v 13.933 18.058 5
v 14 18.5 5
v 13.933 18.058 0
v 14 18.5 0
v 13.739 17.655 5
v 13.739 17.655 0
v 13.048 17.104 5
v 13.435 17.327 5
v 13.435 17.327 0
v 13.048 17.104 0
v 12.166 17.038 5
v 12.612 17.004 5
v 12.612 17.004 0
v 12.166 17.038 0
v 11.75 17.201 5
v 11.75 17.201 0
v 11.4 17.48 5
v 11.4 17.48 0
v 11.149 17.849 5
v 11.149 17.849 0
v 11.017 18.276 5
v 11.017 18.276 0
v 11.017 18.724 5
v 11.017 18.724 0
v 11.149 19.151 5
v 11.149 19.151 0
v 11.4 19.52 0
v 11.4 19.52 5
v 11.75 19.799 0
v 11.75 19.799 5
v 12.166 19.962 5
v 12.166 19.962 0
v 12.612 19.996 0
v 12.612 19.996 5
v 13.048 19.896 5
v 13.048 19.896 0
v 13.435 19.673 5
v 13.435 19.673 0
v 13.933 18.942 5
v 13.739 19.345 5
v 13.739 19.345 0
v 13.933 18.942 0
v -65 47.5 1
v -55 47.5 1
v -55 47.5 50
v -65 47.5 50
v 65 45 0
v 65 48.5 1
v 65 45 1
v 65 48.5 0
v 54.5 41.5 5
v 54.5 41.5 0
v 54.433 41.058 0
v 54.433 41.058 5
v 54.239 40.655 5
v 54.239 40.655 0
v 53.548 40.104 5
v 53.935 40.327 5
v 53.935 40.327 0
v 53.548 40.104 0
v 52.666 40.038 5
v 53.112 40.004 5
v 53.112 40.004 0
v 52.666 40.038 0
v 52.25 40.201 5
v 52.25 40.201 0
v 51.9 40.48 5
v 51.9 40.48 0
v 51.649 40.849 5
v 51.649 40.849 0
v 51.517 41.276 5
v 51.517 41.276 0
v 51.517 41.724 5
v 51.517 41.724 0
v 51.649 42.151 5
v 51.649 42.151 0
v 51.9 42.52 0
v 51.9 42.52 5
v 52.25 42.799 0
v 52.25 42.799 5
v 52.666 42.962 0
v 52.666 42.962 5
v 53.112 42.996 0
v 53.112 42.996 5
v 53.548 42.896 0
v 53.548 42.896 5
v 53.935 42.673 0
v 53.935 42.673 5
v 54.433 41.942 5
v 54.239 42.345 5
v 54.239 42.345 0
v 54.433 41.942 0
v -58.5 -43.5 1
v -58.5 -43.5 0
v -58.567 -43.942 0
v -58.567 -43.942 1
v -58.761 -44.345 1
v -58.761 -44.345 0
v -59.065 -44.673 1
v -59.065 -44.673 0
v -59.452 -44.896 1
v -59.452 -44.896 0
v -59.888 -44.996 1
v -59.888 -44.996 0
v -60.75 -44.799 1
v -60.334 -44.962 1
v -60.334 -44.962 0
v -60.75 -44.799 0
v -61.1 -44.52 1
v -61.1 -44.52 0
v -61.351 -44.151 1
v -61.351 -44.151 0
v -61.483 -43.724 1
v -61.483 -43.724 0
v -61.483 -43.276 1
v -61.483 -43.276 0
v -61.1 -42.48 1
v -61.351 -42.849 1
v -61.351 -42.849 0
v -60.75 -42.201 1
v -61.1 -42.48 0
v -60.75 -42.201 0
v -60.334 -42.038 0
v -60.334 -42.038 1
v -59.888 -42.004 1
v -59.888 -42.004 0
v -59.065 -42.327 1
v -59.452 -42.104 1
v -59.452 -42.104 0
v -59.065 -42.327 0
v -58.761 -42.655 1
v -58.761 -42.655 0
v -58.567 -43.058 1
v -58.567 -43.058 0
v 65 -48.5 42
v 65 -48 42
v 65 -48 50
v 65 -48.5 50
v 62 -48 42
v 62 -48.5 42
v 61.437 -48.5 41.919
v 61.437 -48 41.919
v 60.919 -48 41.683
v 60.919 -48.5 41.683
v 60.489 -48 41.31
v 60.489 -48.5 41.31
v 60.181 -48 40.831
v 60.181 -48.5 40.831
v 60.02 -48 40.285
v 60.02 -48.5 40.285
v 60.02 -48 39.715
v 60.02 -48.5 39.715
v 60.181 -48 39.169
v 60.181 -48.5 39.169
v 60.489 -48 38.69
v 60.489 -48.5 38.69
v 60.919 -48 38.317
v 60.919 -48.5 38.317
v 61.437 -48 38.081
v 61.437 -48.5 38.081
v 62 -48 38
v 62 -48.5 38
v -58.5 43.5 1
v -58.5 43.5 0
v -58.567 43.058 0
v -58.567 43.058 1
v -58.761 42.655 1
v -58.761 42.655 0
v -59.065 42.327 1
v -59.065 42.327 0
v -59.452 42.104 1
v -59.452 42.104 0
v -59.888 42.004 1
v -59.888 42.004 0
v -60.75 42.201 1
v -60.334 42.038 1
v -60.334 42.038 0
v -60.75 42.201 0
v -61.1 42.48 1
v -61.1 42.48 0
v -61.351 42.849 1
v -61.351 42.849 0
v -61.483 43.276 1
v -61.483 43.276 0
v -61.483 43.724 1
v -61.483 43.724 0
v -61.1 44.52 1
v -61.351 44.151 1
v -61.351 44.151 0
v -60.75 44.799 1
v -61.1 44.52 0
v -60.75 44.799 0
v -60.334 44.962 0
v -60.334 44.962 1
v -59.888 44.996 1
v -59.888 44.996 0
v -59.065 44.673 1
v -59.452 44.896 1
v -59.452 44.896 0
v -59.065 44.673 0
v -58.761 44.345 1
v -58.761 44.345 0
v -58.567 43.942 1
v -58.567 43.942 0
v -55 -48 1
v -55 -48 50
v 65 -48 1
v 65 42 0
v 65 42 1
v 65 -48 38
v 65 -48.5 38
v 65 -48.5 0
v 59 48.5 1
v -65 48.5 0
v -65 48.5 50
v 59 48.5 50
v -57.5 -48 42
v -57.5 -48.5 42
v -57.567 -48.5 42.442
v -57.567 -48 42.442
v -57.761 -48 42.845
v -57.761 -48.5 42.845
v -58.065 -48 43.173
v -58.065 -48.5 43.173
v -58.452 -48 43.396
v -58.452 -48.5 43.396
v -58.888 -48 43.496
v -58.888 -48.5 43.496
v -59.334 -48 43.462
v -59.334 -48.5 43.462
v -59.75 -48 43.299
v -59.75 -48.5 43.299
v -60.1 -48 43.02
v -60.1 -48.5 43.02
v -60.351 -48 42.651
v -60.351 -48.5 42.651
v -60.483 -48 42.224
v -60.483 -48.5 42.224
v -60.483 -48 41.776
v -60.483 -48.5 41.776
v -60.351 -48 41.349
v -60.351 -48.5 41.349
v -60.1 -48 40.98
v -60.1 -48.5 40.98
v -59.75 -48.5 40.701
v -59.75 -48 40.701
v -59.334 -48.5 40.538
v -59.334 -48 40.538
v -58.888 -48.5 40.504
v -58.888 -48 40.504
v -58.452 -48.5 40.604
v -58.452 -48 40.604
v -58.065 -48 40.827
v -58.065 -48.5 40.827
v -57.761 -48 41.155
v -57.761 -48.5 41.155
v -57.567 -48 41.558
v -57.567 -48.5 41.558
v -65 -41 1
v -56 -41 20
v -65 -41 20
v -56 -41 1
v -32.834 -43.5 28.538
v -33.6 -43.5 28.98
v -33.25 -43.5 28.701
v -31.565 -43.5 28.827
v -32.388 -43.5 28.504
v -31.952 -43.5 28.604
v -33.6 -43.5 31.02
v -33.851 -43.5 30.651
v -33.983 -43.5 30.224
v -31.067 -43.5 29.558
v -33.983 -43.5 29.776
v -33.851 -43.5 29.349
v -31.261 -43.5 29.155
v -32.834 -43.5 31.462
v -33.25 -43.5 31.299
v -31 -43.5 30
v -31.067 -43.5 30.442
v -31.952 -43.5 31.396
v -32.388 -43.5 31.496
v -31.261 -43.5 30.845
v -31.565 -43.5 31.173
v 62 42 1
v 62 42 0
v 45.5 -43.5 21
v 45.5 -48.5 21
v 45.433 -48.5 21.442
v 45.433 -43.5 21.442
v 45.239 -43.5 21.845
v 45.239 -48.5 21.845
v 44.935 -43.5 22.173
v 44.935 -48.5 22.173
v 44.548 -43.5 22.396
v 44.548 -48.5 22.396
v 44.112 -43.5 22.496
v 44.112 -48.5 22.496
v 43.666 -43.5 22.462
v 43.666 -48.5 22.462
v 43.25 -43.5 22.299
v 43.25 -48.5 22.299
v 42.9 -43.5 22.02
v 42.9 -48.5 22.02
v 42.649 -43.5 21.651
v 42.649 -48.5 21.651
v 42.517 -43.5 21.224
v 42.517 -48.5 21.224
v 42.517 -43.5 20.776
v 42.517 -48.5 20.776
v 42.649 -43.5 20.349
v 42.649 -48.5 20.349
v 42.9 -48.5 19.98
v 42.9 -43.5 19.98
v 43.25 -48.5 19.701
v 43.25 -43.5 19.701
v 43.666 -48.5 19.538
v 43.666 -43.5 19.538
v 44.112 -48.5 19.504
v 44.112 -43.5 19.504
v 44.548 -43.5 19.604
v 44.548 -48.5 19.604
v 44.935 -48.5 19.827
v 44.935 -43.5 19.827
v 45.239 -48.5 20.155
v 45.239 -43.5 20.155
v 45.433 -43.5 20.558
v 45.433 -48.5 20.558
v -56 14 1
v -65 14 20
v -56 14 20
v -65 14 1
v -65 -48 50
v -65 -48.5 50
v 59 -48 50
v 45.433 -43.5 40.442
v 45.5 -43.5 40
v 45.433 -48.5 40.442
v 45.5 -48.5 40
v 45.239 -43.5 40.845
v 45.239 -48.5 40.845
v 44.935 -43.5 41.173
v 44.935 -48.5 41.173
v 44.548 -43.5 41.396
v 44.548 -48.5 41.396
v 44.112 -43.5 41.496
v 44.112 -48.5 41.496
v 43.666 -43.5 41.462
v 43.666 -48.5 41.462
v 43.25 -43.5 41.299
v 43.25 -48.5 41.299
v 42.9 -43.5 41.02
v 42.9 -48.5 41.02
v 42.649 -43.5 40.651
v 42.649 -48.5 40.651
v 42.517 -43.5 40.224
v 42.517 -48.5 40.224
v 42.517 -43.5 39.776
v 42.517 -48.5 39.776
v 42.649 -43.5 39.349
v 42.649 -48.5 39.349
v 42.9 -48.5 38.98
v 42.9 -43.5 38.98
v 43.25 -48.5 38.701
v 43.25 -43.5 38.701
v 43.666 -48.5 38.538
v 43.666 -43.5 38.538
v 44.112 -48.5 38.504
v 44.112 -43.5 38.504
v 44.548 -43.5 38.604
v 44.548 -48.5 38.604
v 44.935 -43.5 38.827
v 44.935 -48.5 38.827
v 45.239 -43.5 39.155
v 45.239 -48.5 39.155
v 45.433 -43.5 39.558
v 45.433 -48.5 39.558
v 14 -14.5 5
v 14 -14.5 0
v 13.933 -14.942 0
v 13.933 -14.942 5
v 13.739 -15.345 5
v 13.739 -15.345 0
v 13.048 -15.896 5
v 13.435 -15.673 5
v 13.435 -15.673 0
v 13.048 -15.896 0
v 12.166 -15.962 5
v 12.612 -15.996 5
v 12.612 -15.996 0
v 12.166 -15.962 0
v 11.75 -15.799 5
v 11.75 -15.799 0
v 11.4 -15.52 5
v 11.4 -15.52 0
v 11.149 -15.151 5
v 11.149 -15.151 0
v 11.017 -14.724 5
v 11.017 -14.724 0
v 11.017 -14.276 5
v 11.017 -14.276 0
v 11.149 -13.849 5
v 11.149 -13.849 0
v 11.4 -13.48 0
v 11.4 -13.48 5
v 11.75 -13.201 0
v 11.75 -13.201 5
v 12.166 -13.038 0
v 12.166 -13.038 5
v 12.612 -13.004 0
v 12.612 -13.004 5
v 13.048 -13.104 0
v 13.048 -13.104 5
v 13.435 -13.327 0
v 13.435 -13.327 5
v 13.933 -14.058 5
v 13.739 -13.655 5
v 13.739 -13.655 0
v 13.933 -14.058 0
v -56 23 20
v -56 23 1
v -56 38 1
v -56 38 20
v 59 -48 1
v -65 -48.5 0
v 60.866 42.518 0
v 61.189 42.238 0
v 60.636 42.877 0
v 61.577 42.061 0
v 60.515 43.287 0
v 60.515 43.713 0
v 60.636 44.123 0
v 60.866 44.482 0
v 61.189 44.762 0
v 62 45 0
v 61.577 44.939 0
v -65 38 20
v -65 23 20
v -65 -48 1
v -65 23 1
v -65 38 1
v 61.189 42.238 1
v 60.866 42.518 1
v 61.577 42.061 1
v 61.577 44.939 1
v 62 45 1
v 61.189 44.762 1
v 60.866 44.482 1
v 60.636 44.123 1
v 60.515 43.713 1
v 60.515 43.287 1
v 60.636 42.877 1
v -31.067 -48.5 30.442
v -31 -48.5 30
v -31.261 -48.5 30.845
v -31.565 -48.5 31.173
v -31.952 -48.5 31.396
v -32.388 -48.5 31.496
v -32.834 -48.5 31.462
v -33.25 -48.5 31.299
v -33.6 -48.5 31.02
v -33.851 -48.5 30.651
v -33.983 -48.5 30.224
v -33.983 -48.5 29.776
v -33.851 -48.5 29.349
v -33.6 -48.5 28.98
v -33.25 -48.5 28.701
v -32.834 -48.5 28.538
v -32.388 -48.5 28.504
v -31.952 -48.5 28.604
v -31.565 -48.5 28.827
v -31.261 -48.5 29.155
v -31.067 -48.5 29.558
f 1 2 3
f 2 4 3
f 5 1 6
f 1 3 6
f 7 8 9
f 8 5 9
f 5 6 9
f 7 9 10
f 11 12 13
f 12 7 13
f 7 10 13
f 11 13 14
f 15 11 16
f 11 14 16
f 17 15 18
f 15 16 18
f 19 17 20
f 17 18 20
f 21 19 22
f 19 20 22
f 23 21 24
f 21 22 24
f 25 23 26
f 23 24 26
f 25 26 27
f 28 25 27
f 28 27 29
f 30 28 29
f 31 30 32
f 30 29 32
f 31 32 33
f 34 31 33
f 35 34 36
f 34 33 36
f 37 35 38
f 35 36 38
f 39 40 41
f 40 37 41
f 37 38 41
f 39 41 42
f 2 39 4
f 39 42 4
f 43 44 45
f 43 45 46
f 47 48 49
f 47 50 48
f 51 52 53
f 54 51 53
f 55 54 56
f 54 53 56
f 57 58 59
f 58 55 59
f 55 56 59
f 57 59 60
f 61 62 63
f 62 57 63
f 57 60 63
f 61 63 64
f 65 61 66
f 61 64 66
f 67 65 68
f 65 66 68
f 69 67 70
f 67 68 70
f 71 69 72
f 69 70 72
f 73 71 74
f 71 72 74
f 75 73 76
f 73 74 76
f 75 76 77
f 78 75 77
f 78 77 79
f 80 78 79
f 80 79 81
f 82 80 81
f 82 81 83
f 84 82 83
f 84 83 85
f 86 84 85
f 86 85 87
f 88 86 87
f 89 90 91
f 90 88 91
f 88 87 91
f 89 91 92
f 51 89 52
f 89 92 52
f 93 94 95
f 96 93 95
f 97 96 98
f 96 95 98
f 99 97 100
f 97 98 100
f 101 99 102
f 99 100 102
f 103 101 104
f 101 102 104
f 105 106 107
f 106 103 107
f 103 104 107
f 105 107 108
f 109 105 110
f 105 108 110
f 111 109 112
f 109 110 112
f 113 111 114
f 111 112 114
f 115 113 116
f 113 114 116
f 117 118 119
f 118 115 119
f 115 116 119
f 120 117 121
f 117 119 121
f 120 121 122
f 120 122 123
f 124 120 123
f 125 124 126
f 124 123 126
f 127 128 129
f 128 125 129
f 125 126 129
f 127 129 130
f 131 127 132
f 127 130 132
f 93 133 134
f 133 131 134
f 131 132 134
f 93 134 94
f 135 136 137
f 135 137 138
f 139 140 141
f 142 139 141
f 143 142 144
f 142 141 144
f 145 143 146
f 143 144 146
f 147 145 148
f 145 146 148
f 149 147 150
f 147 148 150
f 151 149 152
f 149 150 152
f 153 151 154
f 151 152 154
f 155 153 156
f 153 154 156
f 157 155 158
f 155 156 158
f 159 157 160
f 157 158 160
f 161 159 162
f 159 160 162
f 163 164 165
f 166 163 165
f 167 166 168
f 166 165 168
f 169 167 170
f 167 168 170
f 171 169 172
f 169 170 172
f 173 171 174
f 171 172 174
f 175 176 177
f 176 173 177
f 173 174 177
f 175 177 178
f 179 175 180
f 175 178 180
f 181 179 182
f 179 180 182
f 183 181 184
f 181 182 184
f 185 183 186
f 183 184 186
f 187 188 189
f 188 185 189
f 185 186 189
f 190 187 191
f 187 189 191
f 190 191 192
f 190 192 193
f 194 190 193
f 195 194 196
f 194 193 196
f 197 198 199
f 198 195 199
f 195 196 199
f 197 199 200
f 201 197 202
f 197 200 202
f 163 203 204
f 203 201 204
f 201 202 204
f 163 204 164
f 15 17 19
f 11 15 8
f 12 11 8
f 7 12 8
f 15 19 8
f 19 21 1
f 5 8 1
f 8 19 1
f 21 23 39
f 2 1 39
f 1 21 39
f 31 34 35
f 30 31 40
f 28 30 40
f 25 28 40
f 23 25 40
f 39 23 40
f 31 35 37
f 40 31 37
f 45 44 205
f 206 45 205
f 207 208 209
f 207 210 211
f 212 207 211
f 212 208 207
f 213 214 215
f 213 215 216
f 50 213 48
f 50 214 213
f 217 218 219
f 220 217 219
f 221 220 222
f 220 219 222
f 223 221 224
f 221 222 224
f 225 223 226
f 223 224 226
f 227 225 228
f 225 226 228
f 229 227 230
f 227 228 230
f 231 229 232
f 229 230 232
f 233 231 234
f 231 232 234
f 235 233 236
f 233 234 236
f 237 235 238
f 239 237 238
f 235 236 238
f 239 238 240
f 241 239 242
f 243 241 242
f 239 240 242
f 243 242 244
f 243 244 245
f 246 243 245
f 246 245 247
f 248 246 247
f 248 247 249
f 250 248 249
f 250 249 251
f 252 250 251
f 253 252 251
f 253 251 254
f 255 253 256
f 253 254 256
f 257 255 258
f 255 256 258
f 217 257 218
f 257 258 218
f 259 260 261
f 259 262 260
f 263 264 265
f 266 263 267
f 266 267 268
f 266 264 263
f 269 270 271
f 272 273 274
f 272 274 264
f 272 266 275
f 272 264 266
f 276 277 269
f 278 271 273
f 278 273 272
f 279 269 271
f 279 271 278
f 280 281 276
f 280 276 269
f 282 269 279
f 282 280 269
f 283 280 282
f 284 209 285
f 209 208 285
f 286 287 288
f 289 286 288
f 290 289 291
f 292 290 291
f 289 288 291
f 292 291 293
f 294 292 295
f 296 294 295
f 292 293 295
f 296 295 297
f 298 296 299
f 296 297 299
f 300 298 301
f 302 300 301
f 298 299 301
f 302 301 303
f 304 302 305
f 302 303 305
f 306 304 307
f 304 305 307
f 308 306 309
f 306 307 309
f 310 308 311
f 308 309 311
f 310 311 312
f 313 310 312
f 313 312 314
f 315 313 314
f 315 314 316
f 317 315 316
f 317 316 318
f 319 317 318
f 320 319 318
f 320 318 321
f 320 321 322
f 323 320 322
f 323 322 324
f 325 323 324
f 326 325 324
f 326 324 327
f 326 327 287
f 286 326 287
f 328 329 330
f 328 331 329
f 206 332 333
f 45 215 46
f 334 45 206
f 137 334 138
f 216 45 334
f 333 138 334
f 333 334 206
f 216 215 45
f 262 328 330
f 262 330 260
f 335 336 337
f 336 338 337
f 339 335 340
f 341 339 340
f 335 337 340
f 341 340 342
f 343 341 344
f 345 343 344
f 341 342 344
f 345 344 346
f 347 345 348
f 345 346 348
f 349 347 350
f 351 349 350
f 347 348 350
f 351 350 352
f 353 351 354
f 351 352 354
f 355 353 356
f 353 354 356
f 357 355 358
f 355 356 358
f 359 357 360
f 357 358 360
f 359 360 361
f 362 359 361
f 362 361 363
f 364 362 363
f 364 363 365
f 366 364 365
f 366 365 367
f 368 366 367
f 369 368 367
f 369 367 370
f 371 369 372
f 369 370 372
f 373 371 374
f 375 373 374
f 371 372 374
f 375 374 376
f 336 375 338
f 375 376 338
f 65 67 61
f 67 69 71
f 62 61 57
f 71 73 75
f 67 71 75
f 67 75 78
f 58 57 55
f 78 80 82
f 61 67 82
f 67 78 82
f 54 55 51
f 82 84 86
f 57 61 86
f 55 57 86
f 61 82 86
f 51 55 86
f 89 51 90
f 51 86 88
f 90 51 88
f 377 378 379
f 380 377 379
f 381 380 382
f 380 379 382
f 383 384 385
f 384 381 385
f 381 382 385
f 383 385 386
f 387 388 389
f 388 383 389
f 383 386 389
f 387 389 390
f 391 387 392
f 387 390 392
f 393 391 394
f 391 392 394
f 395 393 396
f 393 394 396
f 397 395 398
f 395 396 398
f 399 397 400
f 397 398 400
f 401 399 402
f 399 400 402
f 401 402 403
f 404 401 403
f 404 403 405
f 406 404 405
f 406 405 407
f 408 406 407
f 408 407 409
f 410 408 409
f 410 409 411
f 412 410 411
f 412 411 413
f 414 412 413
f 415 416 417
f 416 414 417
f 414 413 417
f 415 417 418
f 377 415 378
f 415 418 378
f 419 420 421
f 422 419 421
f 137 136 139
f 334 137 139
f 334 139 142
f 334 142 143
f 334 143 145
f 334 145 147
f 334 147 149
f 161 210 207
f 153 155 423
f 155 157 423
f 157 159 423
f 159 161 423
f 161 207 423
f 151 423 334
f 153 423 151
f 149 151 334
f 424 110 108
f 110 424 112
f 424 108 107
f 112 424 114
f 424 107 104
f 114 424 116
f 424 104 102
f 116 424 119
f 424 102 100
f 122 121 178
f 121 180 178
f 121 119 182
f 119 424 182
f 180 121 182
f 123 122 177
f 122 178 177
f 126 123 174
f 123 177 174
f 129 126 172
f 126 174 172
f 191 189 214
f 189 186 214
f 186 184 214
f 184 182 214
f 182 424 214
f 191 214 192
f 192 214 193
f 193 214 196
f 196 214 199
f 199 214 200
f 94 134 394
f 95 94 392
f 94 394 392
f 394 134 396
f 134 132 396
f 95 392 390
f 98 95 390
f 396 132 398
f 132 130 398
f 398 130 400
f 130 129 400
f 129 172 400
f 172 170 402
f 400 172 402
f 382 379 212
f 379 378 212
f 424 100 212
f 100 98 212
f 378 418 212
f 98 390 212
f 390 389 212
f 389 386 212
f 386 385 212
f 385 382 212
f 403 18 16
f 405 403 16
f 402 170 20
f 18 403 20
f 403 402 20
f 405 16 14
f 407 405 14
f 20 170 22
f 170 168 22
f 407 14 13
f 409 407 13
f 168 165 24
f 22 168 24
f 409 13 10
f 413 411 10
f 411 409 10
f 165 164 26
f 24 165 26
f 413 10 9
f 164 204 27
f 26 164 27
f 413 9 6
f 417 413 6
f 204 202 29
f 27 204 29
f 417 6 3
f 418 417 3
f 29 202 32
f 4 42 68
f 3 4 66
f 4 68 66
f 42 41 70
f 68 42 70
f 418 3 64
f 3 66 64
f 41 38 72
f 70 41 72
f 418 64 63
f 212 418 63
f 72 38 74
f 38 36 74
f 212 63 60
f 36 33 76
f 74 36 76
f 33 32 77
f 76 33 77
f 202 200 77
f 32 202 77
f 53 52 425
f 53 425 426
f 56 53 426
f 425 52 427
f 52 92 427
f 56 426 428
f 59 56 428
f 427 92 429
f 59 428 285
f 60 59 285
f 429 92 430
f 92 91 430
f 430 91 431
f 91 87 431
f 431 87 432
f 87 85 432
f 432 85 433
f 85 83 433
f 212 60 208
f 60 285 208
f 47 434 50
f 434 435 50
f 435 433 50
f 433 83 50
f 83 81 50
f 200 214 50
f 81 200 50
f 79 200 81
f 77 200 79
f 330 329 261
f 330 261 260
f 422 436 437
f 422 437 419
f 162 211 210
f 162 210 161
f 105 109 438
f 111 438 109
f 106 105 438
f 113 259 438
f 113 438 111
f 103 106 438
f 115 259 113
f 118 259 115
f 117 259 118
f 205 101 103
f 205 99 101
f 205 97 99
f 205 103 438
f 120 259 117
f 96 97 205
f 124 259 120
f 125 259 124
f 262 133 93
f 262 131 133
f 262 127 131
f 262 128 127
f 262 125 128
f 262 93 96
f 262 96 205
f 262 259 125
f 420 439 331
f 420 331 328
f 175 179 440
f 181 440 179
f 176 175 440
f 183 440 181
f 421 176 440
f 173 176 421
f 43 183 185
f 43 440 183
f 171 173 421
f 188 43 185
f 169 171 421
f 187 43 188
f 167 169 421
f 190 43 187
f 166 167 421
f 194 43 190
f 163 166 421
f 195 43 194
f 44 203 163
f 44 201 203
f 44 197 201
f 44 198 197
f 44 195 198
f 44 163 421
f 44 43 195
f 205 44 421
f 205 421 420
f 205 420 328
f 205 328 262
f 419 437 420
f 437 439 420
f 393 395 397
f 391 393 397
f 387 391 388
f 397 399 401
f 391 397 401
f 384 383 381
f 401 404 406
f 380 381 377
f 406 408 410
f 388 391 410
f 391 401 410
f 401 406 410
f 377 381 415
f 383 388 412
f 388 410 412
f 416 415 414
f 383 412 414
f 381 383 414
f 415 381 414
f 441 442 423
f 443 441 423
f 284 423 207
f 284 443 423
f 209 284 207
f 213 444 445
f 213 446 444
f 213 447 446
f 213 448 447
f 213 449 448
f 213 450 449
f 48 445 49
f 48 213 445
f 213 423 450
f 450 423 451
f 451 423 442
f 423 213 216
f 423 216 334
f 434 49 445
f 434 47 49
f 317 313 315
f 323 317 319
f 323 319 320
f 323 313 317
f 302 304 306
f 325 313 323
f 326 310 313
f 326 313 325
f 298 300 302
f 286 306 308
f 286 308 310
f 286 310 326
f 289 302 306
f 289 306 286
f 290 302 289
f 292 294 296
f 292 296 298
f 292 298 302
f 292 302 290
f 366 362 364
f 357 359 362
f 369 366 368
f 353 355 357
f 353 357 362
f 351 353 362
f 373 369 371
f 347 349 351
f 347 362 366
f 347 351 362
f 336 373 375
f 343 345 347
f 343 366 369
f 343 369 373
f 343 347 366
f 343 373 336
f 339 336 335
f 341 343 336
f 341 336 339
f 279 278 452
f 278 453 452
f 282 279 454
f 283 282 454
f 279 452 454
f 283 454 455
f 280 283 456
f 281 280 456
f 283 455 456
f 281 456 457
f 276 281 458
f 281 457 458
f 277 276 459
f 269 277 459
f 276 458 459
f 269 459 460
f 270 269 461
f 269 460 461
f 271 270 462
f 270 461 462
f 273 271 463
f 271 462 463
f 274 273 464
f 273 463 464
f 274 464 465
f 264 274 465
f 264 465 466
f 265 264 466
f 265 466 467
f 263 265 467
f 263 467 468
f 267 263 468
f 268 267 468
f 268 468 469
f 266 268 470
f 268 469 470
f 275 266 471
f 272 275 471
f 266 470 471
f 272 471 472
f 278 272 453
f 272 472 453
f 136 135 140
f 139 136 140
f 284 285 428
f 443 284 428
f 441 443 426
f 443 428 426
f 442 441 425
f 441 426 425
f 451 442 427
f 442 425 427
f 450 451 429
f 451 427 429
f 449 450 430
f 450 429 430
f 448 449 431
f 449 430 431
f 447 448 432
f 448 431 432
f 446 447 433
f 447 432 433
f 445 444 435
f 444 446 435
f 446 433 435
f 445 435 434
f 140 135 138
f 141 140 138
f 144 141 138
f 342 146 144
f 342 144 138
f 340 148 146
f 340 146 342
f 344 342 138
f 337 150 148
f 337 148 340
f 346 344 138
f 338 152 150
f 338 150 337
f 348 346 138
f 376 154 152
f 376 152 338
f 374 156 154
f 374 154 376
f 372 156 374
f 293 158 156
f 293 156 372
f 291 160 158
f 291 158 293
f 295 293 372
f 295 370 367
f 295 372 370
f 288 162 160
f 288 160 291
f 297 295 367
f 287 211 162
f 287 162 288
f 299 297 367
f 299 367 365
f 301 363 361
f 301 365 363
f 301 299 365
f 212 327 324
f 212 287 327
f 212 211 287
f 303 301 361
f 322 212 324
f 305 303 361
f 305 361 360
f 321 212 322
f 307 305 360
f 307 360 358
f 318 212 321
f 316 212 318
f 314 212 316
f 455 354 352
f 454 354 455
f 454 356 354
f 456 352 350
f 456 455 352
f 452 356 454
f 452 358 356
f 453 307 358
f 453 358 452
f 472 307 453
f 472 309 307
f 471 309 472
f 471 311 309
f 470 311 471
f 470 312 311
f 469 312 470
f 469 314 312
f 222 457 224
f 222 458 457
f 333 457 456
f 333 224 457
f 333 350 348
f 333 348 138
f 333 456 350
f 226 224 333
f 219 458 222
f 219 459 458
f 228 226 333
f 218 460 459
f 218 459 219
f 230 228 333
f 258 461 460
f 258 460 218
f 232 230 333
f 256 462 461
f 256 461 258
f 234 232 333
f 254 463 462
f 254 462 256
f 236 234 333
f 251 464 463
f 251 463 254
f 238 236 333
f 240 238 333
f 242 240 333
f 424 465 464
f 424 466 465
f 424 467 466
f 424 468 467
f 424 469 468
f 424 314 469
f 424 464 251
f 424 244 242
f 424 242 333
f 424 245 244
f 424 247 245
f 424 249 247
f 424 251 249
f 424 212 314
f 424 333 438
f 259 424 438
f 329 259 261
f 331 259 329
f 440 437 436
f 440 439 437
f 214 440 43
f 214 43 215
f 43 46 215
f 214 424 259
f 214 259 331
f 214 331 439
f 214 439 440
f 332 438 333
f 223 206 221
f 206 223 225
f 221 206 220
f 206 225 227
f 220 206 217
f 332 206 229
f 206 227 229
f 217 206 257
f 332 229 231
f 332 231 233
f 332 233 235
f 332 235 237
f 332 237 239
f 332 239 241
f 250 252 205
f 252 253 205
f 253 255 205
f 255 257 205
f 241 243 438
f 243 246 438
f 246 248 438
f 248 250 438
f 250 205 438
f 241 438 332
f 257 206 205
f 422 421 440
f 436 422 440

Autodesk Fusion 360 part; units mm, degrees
sketch "Sketch1" plane through (0, 0, 0) normal (0, 0, 1) x (1, 0, 0)
  line L0 (65, -48.5) -> (-65, -48.5)
  line L1 (-65, -48.5) -> (-65, 48.5)
  line L2 (-65, 48.5) -> (65, 48.5)
  line L3 (65, 48.5) -> (65, -48.5)
  line L4 (65, -48.5) -> (-65, 48.5) construction
  line L5 (-65, -48.5) -> (65, 48.5) construction
  line L6 (-65, 48.5) -> (2983, 48.5)
  line L7 (2983, 48.5) -> (2983, -49)
  line L8 (2983, -49) -> (-65, -49)
  line L9 (-65, -49) -> (-65, 48.5)
  line L10 (-65, 48.5) -> (-55, 48.5)
  line L11 (-55, 48.5) -> (-55, -49)
  line L12 (-55, -49) -> (-65, -49)
  line L13 (-65, -49) -> (-65, 48.5)
  line L14 (65, 48.5) -> (59, 48.5)
  line L15 (59, 48.5) -> (59, 38.5)
  line L16 (59, 38.5) -> (65, 38.5)
  line L17 (65, 38.5) -> (65, 48.5)
  line L18 (59, 38.5) -> (59, -49)
  line L19 (-65, 48.5) -> (59, 48.5)
  line L20 (59, 48.5) -> (59, 47.5)
  line L21 (59, 47.5) -> (-65, 47.5)
  line L22 (-65, 47.5) -> (-65, 48.5)
  line L23 (-65, -49) -> (65, -49)
  line L24 (65, -49) -> (65, -48)
  line L25 (65, -48) -> (-65, -48)
  line L26 (-65, -48) -> (-65, -49)
  line L27 (-56, 38) -> (-65, 38)
  line L28 (-65, 38) -> (-65, 23)
  line L29 (-65, 23) -> (-56, 23)
  line L30 (-56, 23) -> (-56, 38)
  line L31 (-56, -41) -> (-65, -41)
  line L32 (-65, -41) -> (-65, 14)
  line L33 (-65, 14) -> (-56, 14)
  line L34 (-56, 14) -> (-56, -41)
  line L35 (-65, 48.5) -> (-60, 48.5) construction
  line L36 (-60, 48.5) -> (-60, 43.5) construction
  circle A0 centre (-60, 43.5) radius 1.5
  line L37 (65, 48.5) -> (53, 48.5) construction
  line L38 (53, 48.5) -> (53, 41.5) construction
  circle A1 centre (53, 41.5) radius 1.5
  line L39 (65.5, 45) -> (62, 45)
  line L40 (65.5, 42) -> (62, 42)
  arc A2 (62, 45) -> (62, 42) centre (62, 43.5) ccw
  line L41 (-65, 48.5) -> (12.5, 48.5) construction
  line L42 (12.5, 48.5) -> (12.5, 18.5) construction
  line L43 (12.5, 18.5) -> (12.5, -14.5) construction
  circle A3 centre (12.5, 18.5) radius 1.5
  circle A4 centre (12.5, -14.5) radius 1.5
  line L44 (-65, -48.5) -> (-60, -48.5) construction
  line L45 (-60, -48.5) -> (-60, -43.5) construction
  circle A5 centre (-60, -43.5) radius 1.5
  dimension "d1" = 130
  dimension "d2" = 97
  dimension "d3" = 3048
  dimension "d4" = 10
  dimension "d5" = 6
  dimension "d6" = 10
  dimension "d7" = 1
  dimension "d8" = 1
  dimension "d9" = 15
  dimension "d10" = 55
  dimension "d11" = 5
  dimension "d12" = 5
  dimension "d13" = 3
  dimension "d14" = 12
  dimension "d15" = 7
  dimension "d16" = 3
  dimension "d17" = 77.5
  dimension "d18" = 30
  dimension "d19" = 33
  dimension "d20" = 3
  dimension "d21" = 3
  dimension "d22" = 5
  dimension "d23" = 5
  dimension "d24" = 3
extrude "Extrude1" add sketch "Sketch1" along normal blind 50 contours L0 L3 L18 L24 L25 | L0 L11 L18 L25 | L0 L1 L9 L11 L13 L25 L26 | L11 L15 L18 L21 L25 | L1 L2 L6 L9 L10 L11 L13 L19 L21 L22 | L2 L6 L11 L15 L19 L20 L21 | A1 | A3 | A4 makes body 1
extrude "Extrude2" add sketch "Sketch1" along normal blind 20 separate body contours L1 L9 L13 L31 L32 L33 L34 | L1 L9 L13 L27 L28 L29 L30 makes body 2 at (-65, -22.6667, 6.6667) makes body 3 at (-56, 28, 6.6667)
extrude "Extrude3" add sketch "Sketch1" along normal blind 1 contours L3 L16 L18 L25 | L2 L3 L6 L14 L15 L16 L17 L20 L39 L40 A2 | L1 L9 L11 L13 L21 L25 L27 L29 L30 L31 L33 L34 bodies 1 2 3
extrude "Extrude4" cut sketch "Sketch1" along normal blind 5 contours A1 | A3 | A4 bodies 1
sketch "Sketch2" plane through (0, -48.5, 0) normal (0, -1, 0) x (1, 0, 0)
  line L0 (-65, 0) -> (65, 0)
  line L1 (65, 0) -> (65, 50)
  line L2 (65, 50) -> (-65, 50)
  line L3 (-65, 50) -> (-65, 0)
  line L4 (-65, 50) -> (65, 50)
  line L5 (-65, 0) -> (-65, 50)
  line L6 (65, 0) -> (-65, 0)
  line L7 (65, 0) -> (65, 50)
  line L8 (-65, 50) -> (-59, 50) construction
  line L9 (-59, 50) -> (-59, 42) construction
  circle A0 centre (-59, 42) radius 1.5
  line L10 (65, 50) -> (65, 40) construction
  line L11 (65, 38) -> (62, 38)
  line L12 (65, 42) -> (62, 42)
  arc A1 (62, 42) -> (62, 38) centre (62, 40) ccw
  line L13 (-65, 50) -> (-32.5, 50) construction
  line L14 (-32.5, 50) -> (-32.5, 30) construction
  line L15 (65, 50) -> (44, 50) construction
  line L16 (44, 50) -> (44, 40) construction
  line L17 (44, 40) -> (44, 21) construction
  circle A2 centre (-32.5, 30) radius 1.5
  circle A3 centre (44, 40) radius 1.5
  circle A4 centre (44, 21) radius 1.5
  dimension "d33" = 6
  dimension "d34" = 8
  dimension "d35" = 3
  dimension "d36" = 10
  dimension "d37" = 32.5
  dimension "d38" = 20
  dimension "d39" = 21
  dimension "d40" = 10
  dimension "d41" = 19
  dimension "d42" = 3
  dimension "d43" = 3
  dimension "d44" = 3
extrude "Extrude5" cut sketch "Sketch2" against normal blind 5 contours L1 L7 L11 L12 A1 | A0 | A2 | A3 | A4 bodies 1
equation "d3 = 10'-0\""
